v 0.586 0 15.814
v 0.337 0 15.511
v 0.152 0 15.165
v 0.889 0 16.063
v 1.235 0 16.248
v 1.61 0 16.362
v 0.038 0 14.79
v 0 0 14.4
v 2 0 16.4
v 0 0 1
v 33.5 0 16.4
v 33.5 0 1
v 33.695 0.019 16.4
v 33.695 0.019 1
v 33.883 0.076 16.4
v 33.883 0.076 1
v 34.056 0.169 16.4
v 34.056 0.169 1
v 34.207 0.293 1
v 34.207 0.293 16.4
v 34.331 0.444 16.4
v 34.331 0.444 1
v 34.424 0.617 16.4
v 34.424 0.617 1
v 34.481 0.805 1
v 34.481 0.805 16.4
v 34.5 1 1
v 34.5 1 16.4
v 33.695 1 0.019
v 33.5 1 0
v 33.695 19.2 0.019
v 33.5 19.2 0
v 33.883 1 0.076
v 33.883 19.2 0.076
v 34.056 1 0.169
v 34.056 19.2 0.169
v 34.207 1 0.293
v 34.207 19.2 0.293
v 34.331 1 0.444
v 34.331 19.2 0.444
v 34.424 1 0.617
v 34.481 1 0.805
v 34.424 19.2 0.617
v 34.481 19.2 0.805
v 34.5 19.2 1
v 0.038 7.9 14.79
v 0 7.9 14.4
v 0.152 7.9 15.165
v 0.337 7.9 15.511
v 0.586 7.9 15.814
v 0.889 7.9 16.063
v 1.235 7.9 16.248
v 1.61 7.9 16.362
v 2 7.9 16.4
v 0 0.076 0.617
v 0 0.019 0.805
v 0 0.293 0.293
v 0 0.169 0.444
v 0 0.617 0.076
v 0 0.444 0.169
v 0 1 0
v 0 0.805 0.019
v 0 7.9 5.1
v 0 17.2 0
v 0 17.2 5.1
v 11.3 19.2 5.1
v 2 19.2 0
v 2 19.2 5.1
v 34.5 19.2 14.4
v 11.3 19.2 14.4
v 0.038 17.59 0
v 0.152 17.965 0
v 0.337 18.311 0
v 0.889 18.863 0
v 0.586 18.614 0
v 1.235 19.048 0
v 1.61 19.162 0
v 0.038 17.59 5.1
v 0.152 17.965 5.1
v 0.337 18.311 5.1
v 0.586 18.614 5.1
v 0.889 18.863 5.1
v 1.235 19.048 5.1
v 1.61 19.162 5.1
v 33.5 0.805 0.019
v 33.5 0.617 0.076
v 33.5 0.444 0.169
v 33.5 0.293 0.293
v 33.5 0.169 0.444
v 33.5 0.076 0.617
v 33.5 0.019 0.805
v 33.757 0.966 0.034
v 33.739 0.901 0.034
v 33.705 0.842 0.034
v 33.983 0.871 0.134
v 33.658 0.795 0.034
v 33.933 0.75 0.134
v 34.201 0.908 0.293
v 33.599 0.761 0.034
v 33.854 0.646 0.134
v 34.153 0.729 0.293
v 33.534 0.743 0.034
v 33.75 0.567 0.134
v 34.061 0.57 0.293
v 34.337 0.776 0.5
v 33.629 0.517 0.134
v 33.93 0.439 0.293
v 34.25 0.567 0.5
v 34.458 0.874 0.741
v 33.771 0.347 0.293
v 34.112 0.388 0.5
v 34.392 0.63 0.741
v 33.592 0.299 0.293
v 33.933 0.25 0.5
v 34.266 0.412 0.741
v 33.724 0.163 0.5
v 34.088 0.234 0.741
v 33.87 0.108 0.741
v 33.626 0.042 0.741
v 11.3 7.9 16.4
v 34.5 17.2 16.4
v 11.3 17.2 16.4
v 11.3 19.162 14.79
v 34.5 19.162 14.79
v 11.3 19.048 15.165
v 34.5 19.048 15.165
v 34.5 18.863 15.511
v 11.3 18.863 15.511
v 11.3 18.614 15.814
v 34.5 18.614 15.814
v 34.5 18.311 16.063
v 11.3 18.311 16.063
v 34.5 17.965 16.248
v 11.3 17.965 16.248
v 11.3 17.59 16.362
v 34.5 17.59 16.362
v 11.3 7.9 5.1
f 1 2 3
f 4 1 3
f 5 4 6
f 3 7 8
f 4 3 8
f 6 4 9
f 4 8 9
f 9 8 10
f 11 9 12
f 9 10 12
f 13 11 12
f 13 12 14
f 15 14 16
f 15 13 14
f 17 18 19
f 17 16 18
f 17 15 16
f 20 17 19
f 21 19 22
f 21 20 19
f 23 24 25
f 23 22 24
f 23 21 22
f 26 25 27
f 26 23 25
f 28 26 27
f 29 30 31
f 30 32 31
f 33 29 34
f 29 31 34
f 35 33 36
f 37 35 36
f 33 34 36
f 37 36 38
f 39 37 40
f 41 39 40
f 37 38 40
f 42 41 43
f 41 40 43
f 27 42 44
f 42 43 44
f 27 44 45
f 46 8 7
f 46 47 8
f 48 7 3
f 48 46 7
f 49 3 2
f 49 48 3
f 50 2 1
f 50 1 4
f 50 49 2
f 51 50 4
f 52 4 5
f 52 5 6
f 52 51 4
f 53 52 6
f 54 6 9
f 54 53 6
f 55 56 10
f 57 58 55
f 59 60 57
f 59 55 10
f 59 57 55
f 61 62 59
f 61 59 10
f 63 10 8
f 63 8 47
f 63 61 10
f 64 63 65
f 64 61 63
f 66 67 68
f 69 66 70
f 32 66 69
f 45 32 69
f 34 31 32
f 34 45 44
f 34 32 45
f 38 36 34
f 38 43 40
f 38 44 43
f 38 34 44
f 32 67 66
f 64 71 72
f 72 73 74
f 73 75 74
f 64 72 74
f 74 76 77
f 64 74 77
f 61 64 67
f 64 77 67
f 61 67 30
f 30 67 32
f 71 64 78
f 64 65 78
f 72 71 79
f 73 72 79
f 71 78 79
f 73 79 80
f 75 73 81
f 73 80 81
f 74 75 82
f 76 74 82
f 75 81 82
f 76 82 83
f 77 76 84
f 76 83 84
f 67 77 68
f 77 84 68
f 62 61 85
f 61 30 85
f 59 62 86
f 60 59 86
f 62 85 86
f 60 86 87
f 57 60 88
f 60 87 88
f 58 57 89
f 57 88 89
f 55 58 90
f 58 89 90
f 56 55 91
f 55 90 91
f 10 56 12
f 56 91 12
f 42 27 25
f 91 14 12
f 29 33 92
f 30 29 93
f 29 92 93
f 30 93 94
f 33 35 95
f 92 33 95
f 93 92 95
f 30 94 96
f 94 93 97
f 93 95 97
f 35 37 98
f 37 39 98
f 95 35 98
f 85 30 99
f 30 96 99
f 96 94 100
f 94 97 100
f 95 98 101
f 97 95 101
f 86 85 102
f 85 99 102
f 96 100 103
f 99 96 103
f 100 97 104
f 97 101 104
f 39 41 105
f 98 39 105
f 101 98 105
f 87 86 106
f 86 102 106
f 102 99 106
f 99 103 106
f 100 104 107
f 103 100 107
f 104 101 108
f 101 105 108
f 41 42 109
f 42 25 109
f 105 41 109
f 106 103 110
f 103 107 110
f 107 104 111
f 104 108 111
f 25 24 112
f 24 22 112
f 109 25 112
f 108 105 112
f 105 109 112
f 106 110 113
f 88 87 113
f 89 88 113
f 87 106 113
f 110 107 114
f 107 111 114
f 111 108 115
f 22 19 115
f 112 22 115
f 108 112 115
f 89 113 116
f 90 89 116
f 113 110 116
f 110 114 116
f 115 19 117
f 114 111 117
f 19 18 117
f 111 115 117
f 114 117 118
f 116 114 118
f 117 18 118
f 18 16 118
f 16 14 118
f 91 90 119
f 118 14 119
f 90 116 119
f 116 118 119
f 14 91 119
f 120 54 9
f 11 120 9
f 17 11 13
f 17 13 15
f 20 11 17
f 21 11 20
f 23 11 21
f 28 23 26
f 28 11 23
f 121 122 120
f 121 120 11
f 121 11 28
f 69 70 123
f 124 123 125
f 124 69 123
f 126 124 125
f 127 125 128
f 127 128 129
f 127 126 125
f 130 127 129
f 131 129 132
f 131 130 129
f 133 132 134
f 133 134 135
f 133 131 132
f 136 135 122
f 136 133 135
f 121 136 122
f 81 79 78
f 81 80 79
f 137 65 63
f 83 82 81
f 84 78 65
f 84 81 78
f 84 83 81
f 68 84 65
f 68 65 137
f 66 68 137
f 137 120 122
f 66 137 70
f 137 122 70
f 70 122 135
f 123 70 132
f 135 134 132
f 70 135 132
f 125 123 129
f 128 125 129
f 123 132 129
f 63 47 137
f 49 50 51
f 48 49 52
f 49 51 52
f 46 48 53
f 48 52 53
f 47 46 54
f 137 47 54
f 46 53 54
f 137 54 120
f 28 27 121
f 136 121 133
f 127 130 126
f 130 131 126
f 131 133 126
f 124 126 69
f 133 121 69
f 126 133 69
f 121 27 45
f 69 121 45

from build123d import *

# Parameters (mm, degrees)
F0_W     = 34.5
F0_H     = 19.2
F1_DEPTH = 16.4
F2_W     = 11.3
F2_H     = 11.3
F3_DEPTH = 11.3
F4_R     = 1
F5_R     = 2


with BuildPart() as f1:
    # F0 (on Top) → F1 (new body)
    with BuildSketch(Plane.XY):
        with Locations((17.25, 9.6)):
            Rectangle(F0_W, F0_H)
    extrude(amount=F1_DEPTH)

    # F2 (on face) → F3 (cut)
    with BuildSketch(Plane.XY.offset(16.4)):
        with Locations((5.65, 13.55)):
            Rectangle(F2_W, F2_H)
    extrude(amount=-F3_DEPTH, mode=Mode.SUBTRACT)

    # F4
    f4_edges = [f1.edges().sort_by_distance(p)[0] for p in [
        (34.5, 0, 8.2),
        (34.5, 9.6, 0),
        (17.25, 0, 0),
    ]]
    fillet(f4_edges, radius=F4_R)

    # F5
    f5_edges = [f1.edges().sort_by_distance(p)[0] for p in [
        (0, 19.2, 2.55),
        (0, 3.95, 16.4),
        (22.9, 19.2, 16.4),
    ]]
    fillet(f5_edges, radius=F5_R)


solid = f1.part
